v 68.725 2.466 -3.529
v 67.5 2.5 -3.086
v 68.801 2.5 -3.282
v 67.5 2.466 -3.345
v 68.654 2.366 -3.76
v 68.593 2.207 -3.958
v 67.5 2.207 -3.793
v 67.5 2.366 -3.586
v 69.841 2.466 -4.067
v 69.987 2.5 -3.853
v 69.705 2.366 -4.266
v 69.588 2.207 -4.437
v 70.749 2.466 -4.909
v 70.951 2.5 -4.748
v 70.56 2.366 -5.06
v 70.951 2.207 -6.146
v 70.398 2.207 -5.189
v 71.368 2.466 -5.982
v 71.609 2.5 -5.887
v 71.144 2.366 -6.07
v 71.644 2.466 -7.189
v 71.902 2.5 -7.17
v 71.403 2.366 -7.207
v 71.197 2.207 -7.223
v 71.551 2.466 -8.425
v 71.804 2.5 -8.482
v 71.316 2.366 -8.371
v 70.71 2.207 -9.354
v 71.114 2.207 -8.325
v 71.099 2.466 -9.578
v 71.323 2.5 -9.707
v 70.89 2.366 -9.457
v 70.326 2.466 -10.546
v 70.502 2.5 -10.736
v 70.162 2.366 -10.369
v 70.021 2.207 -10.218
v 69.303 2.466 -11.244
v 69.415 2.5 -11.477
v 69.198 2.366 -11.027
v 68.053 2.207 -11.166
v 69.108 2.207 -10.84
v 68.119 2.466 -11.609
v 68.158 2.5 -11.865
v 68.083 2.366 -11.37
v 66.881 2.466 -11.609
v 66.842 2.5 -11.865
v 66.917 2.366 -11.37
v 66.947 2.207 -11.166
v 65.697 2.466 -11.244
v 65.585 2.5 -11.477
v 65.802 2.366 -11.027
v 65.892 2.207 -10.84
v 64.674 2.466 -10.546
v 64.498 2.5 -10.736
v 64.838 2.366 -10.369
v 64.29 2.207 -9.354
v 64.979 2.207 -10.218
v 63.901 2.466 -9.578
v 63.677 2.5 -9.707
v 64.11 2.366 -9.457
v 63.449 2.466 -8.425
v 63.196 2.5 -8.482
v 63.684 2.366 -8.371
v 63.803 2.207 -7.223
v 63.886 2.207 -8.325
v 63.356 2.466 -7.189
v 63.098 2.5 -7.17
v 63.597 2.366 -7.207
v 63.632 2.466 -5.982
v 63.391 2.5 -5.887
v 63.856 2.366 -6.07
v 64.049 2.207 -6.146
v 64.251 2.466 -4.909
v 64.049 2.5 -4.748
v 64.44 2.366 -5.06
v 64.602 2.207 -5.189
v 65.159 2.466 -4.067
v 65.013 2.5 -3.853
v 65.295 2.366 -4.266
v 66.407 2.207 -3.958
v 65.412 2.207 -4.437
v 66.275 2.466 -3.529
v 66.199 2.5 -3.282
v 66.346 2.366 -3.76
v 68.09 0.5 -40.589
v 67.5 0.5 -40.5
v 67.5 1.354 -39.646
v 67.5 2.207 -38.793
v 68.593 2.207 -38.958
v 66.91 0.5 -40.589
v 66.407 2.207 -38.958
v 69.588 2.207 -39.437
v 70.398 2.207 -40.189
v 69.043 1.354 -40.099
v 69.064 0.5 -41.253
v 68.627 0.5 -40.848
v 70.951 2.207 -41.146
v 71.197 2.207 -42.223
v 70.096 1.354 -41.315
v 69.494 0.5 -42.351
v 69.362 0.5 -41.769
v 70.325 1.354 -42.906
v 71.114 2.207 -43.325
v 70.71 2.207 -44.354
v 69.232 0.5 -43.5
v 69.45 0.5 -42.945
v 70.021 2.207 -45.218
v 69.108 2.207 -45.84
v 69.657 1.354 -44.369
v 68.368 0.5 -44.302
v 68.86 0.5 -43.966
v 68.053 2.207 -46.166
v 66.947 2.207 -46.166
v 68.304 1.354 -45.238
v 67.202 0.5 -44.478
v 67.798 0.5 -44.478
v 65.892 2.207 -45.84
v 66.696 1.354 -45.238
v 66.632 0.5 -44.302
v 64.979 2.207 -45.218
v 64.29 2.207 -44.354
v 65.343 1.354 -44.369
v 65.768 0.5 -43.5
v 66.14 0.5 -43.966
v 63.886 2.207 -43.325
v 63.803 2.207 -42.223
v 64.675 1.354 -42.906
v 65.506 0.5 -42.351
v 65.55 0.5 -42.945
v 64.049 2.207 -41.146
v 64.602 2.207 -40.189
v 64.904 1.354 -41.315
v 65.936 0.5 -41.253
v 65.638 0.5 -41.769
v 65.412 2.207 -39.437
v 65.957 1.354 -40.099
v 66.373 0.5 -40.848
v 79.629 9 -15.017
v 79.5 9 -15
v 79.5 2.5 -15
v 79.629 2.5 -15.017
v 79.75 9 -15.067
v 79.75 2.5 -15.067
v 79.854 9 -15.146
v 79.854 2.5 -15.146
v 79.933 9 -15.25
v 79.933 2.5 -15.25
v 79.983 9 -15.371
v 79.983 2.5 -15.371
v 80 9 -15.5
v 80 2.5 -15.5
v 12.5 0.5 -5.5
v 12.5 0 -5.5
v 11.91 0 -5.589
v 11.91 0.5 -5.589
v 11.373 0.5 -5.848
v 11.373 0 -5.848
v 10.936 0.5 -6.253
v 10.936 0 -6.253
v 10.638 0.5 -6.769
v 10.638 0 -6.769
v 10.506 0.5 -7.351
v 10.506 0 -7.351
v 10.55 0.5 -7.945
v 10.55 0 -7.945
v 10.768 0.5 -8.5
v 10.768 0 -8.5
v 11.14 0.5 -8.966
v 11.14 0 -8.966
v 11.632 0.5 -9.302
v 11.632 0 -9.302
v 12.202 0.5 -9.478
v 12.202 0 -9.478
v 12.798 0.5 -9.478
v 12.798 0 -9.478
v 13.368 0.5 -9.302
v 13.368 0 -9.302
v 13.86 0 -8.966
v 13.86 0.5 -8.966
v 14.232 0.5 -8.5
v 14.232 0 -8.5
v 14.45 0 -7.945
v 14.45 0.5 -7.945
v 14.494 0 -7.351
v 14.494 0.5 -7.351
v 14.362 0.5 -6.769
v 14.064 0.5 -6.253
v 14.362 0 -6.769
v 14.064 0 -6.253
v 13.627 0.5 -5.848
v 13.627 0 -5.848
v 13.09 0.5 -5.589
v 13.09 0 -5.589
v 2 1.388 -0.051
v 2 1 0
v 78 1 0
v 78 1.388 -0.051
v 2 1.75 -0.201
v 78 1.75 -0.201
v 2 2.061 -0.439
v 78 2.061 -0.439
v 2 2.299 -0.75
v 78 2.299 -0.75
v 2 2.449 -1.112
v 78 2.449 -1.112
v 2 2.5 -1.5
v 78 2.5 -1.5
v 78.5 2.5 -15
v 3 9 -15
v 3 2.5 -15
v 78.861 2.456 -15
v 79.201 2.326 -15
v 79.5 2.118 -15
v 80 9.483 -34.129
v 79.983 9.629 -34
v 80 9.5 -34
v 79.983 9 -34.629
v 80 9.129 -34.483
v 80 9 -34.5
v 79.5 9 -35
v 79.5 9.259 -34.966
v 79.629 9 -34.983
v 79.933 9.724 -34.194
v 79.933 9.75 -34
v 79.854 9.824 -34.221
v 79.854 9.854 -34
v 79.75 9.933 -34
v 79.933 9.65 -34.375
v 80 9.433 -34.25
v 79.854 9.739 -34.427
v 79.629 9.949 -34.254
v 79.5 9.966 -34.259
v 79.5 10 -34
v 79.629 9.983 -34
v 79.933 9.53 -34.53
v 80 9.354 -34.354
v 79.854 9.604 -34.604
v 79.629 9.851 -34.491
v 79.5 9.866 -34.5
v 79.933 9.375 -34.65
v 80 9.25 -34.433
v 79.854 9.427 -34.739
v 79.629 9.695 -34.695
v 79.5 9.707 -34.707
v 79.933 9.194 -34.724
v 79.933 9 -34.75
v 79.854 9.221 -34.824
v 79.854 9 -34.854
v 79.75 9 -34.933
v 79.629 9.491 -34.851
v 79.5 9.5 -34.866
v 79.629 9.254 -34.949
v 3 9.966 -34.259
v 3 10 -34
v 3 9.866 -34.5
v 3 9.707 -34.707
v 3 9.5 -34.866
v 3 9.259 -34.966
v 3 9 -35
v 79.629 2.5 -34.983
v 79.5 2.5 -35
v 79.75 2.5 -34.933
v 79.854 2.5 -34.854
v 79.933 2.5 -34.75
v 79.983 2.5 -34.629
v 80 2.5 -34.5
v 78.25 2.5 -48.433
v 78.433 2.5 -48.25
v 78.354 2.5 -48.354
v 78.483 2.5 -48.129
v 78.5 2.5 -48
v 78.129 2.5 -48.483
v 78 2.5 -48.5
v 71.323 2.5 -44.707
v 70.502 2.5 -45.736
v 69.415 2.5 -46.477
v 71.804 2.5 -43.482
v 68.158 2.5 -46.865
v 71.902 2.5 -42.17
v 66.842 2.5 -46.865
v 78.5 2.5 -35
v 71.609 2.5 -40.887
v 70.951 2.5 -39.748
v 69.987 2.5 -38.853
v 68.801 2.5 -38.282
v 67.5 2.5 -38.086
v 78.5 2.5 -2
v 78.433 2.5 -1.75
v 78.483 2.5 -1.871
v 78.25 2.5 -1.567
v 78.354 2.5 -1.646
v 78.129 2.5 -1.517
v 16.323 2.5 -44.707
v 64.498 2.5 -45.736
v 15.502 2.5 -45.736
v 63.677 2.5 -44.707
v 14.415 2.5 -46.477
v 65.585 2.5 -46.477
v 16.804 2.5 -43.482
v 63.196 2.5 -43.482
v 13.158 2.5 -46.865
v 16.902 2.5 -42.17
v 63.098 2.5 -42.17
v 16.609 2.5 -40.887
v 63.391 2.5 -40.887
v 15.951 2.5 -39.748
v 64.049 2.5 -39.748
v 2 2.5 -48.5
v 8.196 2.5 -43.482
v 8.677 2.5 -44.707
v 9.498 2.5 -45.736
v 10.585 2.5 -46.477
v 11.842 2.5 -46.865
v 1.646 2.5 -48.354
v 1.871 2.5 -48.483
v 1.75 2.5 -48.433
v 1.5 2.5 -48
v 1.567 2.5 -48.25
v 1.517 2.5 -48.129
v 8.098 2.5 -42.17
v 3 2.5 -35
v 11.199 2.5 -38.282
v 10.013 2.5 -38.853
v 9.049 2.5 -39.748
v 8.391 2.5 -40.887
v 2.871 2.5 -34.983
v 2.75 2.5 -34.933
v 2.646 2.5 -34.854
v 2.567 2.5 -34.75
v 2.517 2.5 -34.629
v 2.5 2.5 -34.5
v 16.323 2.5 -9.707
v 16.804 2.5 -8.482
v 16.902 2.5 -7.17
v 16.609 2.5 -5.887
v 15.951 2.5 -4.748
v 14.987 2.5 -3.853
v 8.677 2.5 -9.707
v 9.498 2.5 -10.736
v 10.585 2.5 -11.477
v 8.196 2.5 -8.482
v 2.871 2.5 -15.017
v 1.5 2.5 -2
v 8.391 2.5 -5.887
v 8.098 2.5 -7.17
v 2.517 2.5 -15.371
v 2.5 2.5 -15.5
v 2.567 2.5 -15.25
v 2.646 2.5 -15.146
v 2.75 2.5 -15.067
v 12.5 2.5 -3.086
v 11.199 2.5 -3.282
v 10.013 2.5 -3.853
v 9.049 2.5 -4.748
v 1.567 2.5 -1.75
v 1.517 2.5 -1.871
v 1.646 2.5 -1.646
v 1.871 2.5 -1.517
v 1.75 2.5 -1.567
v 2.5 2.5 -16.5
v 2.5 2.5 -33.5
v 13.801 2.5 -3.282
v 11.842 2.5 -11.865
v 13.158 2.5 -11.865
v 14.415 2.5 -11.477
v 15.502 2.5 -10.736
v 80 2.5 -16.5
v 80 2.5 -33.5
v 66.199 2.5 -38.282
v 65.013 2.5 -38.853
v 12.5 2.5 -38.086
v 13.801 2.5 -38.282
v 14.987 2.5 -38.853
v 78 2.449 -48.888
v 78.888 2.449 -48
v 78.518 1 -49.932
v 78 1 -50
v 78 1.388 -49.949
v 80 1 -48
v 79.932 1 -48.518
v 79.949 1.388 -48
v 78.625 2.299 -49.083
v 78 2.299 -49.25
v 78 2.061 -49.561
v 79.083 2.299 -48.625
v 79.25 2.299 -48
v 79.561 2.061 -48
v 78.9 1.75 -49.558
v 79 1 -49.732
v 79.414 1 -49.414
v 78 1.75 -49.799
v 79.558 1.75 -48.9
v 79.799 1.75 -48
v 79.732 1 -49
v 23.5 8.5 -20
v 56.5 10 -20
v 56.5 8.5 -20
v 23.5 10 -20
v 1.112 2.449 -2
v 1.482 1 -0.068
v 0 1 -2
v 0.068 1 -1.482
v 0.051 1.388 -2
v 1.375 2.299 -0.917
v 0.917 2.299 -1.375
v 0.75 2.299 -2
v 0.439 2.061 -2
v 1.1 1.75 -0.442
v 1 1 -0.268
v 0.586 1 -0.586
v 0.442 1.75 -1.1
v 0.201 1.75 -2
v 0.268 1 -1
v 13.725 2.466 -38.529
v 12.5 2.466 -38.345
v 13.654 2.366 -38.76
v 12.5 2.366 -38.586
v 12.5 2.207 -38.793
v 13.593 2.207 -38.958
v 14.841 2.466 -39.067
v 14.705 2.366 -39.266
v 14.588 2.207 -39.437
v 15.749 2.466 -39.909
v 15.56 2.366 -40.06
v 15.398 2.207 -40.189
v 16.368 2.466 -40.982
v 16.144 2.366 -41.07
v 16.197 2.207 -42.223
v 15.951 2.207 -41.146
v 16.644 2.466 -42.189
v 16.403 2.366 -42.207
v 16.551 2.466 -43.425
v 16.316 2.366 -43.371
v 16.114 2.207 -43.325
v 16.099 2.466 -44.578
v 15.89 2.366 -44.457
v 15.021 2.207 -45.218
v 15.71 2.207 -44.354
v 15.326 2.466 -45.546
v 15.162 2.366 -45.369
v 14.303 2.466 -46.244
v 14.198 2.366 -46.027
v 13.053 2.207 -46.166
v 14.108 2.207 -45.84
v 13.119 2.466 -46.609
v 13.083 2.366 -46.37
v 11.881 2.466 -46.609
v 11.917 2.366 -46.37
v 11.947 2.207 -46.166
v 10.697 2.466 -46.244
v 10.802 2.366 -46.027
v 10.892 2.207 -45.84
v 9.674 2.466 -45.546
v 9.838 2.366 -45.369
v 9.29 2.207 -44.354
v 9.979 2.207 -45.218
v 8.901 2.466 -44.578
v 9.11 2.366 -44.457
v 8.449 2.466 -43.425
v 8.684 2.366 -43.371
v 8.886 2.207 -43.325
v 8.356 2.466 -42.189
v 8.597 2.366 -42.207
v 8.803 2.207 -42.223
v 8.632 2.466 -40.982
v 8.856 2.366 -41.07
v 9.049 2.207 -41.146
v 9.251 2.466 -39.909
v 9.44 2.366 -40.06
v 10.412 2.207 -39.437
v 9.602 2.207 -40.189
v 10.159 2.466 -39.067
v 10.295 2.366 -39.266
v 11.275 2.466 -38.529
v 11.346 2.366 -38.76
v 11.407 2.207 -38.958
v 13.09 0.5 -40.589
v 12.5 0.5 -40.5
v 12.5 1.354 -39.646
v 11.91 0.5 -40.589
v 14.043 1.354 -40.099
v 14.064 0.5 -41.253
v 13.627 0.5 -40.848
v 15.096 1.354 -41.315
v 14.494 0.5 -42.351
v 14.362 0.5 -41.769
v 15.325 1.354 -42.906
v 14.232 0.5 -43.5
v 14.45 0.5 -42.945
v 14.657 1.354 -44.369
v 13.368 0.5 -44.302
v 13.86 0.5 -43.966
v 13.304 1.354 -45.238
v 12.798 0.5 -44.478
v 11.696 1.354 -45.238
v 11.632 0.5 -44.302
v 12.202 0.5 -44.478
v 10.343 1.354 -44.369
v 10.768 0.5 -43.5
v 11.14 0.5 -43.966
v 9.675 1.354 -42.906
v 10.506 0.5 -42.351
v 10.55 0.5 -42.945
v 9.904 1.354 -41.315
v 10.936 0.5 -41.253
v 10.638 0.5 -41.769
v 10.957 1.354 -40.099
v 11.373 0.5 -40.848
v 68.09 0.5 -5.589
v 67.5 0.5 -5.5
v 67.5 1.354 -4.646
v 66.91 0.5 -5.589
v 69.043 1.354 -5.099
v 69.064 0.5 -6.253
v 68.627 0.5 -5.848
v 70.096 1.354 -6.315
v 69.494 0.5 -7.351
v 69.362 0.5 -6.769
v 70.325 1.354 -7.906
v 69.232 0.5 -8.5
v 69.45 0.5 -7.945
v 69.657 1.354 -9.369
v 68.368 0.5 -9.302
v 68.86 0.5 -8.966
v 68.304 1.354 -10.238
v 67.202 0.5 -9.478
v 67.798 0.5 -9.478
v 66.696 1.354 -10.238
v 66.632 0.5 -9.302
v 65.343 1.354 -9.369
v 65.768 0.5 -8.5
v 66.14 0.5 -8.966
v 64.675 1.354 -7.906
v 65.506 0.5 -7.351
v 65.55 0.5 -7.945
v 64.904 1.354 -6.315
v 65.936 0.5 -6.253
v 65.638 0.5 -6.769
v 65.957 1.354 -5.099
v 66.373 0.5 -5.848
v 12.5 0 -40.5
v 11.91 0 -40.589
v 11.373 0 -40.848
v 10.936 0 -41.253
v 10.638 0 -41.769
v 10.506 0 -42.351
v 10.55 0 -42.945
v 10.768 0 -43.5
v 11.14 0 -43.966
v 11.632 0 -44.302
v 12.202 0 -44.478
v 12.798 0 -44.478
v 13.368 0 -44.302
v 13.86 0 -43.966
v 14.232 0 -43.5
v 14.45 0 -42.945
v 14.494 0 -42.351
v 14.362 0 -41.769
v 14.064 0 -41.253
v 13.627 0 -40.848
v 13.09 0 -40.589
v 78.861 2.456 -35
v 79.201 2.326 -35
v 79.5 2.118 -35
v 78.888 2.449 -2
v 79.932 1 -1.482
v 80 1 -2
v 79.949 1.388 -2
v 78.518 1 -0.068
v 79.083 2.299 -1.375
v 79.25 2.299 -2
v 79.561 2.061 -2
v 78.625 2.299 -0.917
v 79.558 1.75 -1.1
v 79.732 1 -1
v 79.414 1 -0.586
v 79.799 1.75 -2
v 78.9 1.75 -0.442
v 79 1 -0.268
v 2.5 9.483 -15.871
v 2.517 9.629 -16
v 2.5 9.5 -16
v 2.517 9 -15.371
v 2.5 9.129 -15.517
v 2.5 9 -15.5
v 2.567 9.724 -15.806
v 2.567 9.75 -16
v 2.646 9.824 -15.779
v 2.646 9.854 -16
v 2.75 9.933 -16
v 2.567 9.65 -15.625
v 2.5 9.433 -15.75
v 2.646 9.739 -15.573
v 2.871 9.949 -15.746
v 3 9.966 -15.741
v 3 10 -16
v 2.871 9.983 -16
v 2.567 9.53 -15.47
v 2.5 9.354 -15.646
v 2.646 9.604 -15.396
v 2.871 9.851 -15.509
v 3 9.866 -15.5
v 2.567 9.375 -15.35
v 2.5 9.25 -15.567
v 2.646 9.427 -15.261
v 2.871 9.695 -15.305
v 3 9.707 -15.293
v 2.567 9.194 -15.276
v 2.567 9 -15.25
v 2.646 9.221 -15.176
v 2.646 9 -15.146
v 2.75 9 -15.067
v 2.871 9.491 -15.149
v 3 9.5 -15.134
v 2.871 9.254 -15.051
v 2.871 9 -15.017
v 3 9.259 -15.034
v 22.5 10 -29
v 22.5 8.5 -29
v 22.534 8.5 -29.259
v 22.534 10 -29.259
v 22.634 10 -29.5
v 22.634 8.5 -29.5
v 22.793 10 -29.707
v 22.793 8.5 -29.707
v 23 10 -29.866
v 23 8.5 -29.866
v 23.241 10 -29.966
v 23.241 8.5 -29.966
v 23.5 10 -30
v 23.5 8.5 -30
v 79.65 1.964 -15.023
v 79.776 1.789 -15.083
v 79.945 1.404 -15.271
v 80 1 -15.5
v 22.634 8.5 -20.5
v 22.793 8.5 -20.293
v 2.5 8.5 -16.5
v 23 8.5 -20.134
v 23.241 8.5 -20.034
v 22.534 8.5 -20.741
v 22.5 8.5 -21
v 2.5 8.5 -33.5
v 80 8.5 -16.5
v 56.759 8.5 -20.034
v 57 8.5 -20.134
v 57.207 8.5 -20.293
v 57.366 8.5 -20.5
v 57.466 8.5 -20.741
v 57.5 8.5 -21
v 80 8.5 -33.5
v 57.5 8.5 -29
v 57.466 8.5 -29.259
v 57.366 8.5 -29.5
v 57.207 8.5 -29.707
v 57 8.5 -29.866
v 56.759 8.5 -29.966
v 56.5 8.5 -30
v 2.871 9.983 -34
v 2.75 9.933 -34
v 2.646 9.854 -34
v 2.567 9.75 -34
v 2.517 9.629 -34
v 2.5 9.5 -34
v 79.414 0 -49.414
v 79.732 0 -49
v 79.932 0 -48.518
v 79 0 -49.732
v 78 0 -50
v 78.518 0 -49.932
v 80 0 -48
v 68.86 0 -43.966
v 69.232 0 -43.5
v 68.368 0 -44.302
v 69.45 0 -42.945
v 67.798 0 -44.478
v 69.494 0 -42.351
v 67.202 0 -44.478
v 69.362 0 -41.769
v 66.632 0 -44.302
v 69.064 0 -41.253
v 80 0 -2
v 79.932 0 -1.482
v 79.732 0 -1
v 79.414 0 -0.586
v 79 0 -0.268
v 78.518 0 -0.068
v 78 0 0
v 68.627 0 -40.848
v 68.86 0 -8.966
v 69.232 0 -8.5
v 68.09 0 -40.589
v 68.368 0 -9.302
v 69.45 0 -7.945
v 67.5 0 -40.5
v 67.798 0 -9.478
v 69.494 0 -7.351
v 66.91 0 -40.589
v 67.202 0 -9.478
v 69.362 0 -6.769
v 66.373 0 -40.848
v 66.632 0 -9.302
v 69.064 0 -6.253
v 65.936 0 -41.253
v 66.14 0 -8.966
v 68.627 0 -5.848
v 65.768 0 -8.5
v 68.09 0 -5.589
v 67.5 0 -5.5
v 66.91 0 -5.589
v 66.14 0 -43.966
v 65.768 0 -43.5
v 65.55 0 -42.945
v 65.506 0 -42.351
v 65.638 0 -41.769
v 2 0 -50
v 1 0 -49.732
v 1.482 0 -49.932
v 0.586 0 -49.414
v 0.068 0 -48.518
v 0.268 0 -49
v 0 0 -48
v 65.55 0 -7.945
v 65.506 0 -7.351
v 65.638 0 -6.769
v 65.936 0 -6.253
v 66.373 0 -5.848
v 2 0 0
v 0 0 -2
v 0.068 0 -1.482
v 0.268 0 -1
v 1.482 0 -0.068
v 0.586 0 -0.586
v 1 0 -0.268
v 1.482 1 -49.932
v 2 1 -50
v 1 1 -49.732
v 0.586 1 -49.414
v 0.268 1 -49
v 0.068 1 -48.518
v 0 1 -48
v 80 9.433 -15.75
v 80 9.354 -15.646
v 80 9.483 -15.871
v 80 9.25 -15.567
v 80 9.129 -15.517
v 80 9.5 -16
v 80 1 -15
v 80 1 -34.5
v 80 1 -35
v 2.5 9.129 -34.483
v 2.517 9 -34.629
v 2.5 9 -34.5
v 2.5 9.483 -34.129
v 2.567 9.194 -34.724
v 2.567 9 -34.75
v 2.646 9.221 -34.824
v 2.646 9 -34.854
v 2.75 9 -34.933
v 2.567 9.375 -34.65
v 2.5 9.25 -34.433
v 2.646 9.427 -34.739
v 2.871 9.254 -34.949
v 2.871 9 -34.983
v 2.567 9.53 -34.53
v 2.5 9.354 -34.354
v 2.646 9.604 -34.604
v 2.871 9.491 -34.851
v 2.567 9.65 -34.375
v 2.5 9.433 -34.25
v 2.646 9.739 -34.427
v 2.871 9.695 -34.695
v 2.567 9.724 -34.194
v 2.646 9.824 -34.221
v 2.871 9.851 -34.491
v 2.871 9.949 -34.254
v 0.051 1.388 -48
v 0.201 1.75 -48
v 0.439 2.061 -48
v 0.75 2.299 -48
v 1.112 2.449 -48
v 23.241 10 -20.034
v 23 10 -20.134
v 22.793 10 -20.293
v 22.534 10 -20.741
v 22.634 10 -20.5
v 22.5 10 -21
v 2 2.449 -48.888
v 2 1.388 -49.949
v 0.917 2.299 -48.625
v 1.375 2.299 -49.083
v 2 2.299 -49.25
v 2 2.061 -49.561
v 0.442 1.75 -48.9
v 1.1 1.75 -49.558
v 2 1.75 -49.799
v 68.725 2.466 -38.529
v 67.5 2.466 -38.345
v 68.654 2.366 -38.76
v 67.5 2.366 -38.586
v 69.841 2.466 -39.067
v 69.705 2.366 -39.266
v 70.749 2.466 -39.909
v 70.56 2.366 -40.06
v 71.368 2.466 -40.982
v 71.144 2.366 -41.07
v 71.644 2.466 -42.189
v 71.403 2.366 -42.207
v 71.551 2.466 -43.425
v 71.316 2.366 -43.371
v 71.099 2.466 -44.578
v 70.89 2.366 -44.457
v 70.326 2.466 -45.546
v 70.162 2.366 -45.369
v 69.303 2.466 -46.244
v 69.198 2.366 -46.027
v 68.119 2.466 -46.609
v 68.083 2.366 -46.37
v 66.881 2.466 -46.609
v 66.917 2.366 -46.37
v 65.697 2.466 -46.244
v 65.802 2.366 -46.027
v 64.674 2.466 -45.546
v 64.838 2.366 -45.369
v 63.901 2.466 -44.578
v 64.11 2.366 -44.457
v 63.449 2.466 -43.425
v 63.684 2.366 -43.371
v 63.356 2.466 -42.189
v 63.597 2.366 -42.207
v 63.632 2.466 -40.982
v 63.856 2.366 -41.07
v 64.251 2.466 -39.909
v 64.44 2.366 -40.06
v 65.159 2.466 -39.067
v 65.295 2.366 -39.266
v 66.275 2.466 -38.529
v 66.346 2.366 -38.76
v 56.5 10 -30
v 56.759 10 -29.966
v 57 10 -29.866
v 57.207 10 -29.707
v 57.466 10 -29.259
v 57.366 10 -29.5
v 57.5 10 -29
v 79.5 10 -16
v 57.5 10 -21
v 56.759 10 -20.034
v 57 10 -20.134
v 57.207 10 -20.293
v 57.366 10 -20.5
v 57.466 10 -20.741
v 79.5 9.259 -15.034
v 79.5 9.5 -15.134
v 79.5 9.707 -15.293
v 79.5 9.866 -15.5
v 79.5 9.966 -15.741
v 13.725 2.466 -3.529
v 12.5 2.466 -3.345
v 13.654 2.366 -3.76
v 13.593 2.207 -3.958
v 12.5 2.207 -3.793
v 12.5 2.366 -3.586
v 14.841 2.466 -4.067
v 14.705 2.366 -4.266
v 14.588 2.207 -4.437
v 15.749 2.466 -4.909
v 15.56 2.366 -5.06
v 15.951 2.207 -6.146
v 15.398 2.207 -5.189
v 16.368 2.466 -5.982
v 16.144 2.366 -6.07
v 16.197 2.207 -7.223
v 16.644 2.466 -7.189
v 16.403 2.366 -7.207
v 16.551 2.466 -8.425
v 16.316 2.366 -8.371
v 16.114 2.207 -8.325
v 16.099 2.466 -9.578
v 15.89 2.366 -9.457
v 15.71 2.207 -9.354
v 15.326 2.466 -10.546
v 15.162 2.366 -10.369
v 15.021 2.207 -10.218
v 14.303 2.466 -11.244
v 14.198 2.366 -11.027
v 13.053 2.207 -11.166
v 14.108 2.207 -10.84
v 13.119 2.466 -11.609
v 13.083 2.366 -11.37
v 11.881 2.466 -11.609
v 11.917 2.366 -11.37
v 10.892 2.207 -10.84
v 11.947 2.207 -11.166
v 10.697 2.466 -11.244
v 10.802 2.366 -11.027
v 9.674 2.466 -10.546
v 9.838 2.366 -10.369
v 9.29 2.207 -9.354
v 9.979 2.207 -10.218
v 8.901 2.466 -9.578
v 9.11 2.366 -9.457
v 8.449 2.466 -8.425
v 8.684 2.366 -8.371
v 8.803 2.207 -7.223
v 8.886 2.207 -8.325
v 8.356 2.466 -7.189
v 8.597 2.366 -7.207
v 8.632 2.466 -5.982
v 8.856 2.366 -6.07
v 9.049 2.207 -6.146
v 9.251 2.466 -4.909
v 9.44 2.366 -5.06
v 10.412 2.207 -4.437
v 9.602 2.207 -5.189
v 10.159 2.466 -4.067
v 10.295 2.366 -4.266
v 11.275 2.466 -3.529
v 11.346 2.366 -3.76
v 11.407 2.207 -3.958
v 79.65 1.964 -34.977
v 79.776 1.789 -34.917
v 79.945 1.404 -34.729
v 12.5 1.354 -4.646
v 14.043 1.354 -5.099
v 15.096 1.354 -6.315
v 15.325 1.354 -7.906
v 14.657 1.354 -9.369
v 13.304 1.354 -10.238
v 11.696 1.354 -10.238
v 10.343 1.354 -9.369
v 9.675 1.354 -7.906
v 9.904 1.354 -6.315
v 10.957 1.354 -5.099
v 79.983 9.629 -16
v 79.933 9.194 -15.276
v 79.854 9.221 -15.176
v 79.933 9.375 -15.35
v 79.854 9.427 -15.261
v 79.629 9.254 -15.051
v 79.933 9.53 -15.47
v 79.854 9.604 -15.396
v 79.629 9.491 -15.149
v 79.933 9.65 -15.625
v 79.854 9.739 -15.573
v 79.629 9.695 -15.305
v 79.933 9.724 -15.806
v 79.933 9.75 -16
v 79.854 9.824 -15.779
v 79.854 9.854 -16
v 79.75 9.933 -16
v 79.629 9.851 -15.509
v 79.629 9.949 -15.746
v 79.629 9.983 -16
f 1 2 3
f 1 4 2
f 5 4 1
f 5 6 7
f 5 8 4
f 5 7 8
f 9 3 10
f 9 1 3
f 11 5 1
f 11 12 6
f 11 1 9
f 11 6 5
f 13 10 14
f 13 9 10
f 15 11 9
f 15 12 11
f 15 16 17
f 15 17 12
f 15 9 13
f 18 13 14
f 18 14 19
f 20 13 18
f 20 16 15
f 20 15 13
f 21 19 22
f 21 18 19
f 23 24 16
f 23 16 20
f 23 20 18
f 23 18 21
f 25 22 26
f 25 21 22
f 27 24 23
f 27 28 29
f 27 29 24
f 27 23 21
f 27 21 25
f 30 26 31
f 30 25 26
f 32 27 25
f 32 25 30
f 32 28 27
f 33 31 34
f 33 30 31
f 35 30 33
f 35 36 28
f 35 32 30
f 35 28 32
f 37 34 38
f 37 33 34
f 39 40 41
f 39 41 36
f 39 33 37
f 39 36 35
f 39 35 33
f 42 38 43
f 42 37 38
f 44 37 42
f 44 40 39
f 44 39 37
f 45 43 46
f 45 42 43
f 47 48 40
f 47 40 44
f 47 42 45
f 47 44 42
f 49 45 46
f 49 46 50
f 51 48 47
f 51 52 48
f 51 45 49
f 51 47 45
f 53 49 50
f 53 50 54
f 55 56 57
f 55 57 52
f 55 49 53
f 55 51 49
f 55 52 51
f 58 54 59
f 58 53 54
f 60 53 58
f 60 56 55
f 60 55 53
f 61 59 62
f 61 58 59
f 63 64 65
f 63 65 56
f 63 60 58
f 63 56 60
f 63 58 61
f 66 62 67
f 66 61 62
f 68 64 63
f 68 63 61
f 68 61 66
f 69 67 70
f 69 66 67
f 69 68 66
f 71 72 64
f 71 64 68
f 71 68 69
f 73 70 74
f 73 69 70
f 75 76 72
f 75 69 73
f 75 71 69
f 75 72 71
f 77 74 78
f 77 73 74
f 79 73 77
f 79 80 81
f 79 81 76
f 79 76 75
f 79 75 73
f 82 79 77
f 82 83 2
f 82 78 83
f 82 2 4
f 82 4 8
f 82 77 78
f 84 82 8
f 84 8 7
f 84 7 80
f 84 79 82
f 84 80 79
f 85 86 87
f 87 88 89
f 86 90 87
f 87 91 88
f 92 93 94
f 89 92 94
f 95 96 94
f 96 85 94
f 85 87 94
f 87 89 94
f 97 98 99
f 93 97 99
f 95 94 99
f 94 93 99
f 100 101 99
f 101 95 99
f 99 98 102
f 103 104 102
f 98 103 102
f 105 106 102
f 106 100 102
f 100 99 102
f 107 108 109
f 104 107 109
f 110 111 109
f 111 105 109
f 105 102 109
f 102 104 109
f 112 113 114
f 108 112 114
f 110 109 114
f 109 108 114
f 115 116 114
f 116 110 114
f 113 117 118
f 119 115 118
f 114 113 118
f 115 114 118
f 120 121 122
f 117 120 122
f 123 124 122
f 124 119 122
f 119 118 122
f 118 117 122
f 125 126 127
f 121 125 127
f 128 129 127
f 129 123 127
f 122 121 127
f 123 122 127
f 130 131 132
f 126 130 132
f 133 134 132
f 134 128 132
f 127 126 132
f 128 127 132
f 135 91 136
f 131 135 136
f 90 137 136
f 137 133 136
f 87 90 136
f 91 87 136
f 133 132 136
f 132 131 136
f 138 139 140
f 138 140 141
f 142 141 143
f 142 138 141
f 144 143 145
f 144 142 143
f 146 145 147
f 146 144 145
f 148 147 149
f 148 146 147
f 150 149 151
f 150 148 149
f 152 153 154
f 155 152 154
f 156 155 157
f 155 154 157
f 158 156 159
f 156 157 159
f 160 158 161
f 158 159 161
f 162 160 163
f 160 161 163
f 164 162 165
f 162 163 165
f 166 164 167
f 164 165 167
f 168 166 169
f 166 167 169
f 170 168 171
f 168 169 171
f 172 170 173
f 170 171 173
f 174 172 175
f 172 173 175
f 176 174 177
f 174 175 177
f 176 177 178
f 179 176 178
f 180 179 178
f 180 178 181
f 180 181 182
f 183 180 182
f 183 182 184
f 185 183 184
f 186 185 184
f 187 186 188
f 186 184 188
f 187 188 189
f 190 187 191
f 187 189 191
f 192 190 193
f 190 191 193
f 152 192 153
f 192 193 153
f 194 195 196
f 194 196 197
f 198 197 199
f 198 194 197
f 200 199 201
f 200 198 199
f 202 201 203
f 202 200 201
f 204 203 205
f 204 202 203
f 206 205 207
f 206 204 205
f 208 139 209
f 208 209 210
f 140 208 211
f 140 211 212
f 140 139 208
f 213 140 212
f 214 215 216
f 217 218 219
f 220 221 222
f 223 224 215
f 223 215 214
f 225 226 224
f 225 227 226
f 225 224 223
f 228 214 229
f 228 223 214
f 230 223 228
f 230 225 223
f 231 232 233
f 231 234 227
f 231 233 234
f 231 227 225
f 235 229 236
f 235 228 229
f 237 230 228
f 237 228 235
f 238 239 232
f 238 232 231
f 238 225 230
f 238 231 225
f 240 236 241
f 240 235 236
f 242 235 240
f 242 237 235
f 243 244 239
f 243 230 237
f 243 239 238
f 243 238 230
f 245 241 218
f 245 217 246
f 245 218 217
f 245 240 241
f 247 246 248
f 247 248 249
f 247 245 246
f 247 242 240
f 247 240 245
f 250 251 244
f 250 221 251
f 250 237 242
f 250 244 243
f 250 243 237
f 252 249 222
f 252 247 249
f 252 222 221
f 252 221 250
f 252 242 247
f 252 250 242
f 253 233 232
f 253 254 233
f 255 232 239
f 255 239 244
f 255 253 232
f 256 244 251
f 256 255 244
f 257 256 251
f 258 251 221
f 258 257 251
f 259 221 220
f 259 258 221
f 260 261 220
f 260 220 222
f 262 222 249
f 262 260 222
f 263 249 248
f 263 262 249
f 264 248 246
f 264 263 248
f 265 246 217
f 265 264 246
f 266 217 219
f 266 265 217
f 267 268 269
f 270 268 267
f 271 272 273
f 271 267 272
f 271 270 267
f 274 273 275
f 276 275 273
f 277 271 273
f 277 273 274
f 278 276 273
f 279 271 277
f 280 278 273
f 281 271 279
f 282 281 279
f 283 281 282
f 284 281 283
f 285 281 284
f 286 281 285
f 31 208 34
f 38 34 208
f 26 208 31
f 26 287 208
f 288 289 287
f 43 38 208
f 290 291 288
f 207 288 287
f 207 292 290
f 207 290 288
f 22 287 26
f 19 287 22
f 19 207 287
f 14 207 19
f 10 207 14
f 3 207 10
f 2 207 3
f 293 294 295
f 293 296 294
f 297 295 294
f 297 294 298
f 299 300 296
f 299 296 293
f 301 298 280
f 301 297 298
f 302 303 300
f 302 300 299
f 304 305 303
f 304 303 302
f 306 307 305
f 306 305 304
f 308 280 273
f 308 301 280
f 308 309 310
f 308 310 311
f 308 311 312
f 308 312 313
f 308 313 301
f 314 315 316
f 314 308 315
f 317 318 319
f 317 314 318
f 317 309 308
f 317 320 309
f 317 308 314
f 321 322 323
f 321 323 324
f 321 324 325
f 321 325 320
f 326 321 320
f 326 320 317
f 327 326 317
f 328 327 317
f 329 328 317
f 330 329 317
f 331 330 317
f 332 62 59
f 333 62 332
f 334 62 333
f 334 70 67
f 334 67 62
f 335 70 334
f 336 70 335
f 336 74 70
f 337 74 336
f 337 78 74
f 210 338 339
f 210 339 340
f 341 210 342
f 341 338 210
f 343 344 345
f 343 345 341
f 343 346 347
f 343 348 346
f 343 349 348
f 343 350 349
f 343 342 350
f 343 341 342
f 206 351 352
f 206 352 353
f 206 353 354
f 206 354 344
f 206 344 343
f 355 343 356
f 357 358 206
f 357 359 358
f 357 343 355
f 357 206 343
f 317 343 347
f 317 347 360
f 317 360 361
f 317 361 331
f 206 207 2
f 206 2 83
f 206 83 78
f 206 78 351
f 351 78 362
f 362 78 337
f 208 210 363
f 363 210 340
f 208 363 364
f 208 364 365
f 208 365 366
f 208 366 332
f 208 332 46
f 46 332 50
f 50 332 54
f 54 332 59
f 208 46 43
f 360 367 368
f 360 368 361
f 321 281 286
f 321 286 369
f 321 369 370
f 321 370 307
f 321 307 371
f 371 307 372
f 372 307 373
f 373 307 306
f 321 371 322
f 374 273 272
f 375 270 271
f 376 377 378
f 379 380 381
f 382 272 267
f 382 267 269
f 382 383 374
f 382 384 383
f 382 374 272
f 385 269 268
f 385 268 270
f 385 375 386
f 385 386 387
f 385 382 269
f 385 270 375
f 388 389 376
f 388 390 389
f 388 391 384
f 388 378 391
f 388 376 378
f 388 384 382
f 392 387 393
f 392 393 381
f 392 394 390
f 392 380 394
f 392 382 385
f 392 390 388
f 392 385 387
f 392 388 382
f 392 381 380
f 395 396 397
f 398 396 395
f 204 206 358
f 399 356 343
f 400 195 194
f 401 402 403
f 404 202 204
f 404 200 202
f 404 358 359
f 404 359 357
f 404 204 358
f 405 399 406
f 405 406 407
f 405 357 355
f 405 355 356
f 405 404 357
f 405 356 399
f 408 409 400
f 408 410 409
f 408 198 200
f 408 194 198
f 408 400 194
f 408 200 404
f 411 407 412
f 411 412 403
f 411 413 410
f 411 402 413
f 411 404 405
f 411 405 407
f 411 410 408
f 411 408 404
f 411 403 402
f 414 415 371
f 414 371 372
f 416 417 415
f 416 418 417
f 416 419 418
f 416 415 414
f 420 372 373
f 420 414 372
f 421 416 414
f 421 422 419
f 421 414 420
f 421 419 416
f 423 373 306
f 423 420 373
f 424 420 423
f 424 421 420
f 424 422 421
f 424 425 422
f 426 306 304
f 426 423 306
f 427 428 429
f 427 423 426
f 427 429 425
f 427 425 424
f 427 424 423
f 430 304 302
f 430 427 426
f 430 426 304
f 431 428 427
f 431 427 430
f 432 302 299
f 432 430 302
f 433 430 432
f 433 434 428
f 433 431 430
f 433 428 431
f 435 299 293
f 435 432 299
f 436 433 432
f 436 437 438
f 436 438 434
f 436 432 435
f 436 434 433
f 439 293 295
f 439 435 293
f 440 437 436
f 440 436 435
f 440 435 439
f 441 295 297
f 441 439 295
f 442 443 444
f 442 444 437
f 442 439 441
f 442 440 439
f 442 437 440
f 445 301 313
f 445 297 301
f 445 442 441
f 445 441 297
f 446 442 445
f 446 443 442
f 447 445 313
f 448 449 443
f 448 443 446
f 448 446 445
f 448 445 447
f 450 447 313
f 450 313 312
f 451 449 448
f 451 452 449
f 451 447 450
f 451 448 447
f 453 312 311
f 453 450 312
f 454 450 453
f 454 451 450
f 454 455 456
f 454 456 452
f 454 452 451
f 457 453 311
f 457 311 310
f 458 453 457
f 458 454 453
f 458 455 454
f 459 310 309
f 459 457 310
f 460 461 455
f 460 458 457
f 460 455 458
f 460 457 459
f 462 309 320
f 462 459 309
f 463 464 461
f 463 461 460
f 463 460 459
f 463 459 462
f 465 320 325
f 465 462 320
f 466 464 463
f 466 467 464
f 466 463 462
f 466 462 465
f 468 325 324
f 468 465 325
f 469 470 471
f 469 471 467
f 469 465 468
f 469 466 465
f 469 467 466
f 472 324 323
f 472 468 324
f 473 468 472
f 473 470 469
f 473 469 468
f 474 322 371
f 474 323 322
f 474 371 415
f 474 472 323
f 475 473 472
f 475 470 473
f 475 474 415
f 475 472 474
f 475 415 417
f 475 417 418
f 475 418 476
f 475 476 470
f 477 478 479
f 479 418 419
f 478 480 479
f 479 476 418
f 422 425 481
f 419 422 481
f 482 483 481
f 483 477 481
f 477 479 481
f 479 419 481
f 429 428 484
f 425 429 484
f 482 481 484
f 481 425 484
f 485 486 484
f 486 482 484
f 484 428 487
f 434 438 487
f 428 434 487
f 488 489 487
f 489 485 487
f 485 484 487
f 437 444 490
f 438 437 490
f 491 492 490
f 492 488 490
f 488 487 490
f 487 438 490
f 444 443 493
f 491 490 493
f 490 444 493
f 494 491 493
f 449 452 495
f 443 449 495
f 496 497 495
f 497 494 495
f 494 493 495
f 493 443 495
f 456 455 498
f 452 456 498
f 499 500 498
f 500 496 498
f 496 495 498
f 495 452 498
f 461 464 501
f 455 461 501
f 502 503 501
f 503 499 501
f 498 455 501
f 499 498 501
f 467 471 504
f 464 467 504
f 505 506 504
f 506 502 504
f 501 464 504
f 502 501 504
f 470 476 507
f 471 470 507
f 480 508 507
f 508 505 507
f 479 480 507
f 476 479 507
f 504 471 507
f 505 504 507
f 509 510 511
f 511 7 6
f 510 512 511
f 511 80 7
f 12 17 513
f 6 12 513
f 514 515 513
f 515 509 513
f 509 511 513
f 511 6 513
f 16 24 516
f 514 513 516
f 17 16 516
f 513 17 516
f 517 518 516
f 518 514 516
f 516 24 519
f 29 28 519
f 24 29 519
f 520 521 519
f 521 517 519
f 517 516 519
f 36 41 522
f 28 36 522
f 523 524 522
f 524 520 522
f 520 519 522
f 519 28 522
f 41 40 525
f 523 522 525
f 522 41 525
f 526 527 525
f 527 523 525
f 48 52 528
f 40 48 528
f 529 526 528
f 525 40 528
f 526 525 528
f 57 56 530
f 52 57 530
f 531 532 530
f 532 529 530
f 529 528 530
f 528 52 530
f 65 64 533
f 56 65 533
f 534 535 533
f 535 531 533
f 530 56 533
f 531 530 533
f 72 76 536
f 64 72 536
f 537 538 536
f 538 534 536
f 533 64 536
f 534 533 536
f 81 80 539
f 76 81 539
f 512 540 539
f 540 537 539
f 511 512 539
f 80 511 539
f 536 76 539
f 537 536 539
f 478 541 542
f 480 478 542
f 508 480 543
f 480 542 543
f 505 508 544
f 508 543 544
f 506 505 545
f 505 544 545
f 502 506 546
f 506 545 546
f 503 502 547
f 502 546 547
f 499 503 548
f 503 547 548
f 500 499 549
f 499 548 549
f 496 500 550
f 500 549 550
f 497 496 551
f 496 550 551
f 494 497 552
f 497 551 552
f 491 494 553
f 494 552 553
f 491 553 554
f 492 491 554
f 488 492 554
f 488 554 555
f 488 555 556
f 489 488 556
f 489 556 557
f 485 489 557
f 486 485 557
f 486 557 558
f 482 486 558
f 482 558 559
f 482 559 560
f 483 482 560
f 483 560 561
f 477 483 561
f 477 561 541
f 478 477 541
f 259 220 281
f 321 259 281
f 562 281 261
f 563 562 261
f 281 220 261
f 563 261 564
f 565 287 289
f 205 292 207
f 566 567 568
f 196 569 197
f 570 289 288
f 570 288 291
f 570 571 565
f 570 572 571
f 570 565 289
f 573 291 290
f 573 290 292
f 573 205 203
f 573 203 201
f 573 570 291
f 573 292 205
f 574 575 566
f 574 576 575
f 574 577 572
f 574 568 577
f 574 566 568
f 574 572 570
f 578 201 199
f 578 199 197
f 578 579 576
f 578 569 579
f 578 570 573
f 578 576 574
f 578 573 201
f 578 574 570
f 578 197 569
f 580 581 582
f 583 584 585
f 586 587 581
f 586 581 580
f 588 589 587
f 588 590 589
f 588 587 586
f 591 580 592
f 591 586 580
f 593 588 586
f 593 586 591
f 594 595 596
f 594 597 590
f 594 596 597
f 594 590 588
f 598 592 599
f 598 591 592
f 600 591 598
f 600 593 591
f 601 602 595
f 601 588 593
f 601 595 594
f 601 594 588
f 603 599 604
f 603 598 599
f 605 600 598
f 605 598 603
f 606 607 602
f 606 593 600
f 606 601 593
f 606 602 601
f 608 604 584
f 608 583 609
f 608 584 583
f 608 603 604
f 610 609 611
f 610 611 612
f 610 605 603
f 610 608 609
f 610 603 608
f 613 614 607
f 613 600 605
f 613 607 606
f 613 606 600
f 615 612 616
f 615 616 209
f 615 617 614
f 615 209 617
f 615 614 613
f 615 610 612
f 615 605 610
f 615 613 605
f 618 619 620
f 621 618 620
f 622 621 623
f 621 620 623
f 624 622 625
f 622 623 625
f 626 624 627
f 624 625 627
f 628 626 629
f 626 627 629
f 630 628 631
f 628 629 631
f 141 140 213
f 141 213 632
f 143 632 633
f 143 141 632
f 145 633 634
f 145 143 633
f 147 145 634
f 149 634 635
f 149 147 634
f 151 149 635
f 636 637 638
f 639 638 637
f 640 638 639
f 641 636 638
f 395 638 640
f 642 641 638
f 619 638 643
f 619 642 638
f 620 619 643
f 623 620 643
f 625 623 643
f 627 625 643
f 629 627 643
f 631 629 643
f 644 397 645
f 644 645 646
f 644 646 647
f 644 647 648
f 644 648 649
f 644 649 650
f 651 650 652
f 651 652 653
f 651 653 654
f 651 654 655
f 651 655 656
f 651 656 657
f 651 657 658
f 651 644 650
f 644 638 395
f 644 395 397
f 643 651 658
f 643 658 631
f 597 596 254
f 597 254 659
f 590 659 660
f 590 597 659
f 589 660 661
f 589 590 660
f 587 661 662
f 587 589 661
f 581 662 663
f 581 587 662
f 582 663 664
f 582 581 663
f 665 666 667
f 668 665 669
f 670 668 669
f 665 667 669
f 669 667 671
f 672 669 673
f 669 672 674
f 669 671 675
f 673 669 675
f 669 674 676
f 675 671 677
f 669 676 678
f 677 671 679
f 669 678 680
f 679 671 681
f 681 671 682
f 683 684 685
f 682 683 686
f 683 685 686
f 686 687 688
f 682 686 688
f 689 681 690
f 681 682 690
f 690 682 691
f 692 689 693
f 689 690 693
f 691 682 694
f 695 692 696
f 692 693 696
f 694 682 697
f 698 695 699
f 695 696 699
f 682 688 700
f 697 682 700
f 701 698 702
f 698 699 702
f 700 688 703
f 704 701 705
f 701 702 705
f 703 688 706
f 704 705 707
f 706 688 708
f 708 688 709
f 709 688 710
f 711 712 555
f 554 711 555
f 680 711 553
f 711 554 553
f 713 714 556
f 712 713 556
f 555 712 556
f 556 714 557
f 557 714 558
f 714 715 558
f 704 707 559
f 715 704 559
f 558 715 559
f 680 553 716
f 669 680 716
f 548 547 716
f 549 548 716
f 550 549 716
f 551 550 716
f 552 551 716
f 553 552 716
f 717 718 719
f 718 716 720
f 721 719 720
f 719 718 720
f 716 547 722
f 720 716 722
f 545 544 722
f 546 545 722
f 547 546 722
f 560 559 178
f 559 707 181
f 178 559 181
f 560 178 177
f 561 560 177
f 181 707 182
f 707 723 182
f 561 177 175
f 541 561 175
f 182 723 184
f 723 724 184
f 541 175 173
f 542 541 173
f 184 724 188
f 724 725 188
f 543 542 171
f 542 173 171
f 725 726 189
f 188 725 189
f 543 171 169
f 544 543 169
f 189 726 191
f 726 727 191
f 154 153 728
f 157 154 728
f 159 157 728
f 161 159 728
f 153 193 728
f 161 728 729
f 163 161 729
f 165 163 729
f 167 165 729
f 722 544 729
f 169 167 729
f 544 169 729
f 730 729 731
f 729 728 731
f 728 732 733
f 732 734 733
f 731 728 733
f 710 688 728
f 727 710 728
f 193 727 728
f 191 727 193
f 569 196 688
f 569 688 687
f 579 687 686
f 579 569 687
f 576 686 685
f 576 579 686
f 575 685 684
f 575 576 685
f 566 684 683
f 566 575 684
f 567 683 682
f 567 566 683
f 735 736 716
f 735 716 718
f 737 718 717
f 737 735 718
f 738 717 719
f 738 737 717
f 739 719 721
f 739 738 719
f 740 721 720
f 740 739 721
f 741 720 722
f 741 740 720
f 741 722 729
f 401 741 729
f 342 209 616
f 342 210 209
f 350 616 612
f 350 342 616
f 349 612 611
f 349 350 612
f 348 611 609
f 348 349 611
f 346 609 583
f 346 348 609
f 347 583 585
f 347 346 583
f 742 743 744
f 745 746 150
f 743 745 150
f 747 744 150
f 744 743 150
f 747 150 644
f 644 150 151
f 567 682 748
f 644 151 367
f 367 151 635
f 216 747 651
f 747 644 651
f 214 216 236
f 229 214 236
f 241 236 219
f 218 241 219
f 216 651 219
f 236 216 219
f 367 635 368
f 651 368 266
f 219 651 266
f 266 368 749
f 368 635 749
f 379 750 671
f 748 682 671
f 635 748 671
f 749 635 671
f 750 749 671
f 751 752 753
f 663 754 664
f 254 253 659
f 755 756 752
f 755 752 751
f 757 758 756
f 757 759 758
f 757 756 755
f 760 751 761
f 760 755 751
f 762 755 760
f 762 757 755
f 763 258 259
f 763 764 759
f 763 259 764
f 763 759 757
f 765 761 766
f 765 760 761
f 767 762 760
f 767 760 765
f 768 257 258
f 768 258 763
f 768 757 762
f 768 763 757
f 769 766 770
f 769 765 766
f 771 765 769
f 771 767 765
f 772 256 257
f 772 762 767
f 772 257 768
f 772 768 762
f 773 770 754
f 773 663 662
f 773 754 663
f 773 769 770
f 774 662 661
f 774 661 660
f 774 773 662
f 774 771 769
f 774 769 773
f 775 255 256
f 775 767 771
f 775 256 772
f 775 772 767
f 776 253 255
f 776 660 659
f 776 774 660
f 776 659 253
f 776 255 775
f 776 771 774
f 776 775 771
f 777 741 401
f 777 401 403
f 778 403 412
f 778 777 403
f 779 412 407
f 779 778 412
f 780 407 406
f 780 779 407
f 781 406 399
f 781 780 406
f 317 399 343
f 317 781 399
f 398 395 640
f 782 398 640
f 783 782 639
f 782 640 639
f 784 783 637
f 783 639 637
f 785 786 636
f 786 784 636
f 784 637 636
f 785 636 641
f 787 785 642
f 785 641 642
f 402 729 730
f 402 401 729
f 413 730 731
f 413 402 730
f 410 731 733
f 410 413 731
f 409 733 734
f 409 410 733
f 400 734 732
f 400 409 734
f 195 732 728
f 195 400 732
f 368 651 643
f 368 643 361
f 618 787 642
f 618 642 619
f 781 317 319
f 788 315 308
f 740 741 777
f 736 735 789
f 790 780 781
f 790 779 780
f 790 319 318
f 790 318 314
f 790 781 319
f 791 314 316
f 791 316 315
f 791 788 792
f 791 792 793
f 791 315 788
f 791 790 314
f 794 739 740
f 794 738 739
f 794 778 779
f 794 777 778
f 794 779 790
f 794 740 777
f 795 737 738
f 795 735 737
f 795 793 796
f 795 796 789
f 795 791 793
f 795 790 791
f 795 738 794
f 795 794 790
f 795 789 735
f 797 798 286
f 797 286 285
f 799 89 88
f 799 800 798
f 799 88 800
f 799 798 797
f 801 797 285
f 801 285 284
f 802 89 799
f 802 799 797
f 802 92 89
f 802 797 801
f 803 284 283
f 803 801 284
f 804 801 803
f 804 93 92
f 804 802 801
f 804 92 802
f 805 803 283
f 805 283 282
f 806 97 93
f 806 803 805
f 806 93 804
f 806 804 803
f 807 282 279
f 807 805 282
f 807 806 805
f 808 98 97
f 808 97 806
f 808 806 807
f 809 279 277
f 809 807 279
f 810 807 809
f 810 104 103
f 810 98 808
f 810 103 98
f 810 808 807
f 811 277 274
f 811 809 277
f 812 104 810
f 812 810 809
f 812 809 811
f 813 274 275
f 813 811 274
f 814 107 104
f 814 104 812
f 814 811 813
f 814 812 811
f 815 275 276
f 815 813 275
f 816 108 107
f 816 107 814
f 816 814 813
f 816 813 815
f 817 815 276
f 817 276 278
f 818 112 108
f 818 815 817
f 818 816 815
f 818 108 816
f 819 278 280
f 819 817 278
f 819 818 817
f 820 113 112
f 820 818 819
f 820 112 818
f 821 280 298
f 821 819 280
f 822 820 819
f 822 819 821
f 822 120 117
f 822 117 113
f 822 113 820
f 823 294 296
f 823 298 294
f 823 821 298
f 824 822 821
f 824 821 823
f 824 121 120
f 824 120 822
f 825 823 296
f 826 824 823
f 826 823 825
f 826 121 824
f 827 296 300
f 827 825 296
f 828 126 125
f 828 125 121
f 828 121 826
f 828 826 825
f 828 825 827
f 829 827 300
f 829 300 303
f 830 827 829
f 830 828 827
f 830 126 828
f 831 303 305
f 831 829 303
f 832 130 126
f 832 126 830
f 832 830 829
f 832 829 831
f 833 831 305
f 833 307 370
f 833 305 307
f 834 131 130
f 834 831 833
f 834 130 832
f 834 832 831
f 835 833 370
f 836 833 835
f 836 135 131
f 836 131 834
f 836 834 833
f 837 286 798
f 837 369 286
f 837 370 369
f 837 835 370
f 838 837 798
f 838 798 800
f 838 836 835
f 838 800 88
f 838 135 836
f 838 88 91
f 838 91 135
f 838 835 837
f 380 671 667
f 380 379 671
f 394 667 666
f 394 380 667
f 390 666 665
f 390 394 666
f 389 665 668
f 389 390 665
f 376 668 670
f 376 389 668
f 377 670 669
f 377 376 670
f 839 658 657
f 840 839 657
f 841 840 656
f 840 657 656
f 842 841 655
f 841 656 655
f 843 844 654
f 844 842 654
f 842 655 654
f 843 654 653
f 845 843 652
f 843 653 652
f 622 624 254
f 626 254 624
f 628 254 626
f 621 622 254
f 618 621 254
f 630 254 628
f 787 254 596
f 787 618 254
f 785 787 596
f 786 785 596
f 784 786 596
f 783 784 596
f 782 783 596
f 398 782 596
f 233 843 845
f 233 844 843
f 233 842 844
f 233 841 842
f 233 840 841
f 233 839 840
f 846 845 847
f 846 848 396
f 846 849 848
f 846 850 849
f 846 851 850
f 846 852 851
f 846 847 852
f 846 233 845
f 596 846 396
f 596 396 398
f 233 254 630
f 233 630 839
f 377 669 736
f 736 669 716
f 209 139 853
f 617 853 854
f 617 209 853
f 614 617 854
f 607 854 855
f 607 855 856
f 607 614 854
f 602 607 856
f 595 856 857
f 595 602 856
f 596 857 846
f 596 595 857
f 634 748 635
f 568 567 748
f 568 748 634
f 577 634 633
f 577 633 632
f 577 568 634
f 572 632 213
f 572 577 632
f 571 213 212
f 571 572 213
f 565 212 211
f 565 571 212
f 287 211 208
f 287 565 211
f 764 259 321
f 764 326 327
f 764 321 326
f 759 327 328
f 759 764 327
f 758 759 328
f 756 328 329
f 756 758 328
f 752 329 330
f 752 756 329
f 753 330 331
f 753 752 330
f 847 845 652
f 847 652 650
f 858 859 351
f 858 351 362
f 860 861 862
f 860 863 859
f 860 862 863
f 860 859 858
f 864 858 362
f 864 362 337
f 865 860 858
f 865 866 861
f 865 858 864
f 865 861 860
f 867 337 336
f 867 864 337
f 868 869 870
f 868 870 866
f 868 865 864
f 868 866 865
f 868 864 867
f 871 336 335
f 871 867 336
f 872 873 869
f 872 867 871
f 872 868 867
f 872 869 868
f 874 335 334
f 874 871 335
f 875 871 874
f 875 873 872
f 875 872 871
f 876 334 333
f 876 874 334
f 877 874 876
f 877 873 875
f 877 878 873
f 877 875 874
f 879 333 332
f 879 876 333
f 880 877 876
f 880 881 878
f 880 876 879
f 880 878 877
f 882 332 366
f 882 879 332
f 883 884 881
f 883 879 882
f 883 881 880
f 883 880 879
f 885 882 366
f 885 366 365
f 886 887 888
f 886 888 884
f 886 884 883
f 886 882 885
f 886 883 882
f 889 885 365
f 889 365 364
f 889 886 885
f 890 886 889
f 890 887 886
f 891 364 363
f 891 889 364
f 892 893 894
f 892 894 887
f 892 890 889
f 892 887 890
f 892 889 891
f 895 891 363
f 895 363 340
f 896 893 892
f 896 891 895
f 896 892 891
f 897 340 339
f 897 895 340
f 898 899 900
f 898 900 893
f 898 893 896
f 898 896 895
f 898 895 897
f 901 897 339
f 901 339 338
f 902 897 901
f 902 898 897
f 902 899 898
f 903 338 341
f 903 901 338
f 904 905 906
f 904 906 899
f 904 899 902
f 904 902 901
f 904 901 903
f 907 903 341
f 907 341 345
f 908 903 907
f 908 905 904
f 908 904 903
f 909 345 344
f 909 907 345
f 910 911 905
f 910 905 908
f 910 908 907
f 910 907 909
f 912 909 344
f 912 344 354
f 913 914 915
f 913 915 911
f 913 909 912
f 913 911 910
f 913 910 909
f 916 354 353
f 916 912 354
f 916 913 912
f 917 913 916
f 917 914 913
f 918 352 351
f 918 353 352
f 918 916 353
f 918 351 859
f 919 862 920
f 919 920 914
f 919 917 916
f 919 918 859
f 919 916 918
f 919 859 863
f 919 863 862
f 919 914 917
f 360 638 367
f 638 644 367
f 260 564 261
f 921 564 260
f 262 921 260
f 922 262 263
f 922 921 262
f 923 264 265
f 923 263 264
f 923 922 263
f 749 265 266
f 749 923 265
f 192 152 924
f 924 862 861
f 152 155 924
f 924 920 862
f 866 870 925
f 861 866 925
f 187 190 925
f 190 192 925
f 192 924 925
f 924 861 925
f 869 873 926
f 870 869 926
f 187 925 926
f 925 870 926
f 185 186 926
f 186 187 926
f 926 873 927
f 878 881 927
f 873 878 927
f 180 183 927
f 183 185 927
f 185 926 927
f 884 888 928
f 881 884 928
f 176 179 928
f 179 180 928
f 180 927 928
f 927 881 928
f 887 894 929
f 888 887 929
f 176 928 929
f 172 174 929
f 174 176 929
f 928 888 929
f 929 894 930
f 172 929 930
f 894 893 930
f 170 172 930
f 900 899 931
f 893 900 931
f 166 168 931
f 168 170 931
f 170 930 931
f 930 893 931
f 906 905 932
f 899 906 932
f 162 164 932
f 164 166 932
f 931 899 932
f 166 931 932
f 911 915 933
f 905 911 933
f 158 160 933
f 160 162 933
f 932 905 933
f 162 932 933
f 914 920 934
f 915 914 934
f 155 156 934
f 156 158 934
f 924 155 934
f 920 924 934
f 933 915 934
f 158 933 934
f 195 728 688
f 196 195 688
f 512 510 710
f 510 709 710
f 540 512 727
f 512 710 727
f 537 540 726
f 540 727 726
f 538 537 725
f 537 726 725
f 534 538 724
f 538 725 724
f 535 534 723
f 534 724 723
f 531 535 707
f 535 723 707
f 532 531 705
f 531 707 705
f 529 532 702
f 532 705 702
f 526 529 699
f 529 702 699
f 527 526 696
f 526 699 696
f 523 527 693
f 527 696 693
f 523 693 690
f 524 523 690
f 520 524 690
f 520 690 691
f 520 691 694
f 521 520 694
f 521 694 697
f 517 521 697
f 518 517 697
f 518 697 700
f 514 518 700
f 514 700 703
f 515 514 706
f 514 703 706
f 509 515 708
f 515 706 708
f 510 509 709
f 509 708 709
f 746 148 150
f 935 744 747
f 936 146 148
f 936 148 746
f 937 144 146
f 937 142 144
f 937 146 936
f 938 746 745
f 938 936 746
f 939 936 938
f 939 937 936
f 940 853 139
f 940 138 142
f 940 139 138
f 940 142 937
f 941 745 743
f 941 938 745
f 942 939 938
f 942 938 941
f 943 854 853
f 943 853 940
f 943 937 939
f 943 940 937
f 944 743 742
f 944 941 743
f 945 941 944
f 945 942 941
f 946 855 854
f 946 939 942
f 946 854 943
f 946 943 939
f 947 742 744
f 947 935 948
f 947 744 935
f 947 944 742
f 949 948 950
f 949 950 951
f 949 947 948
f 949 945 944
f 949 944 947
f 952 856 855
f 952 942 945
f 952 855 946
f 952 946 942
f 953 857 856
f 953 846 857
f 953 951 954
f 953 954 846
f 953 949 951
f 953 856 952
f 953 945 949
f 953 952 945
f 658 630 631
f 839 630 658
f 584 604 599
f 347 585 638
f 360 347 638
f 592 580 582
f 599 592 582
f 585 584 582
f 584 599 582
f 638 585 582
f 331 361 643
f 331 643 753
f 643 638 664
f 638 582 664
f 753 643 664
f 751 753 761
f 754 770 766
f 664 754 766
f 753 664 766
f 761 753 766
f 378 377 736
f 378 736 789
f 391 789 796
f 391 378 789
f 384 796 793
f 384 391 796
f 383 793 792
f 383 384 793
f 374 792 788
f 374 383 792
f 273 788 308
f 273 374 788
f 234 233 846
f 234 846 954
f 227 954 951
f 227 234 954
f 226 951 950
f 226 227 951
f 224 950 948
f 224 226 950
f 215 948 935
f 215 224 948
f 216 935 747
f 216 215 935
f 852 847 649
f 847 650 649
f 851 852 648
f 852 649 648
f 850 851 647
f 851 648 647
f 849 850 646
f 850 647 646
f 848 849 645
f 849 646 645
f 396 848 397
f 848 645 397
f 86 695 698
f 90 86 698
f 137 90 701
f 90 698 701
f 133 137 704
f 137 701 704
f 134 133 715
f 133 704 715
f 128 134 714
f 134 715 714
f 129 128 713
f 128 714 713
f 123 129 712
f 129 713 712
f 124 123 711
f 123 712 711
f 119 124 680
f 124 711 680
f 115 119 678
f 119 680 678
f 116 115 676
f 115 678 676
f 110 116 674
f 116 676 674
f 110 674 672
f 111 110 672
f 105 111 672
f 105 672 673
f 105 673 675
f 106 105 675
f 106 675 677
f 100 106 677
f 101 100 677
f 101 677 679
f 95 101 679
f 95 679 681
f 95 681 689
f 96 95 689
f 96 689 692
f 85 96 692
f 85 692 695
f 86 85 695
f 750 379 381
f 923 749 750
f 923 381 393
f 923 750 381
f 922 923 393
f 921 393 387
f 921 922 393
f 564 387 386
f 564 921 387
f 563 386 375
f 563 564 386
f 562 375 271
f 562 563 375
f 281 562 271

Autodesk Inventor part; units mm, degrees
ref_plane "YZ Plane" through (0, 0, 0) normal (1, 0, 0) x (0, 1, 0)
ref_plane "XZ Plane" through (0, 0, 0) normal (0, 1, 0) x (-1, 0, 0)
ref_plane "XY Plane" through (0, 0, 0) normal (0, 0, 1) x (1, 0, 0)
sketch "Sketch1" plane through (0, 0, 0) normal (0, 1, 0) x (-1, 0, 0)
  line L0 (0, 0) -> (-80, 0)
  line L1 (-80, 0) -> (-80, -50)
  line L2 (-80, -50) -> (0, -50)
  line L3 (0, -50) -> (0, 0)
  dimension "d0" = 80
  dimension "d1" = 50
extrude "Extrusion1" add sketch "Sketch1" along normal blind 2.5
sketch "Sketch2" plane through (0, 2.5, 0) normal (0, 1, 0) x (1, 0, 0)
  circle A0 centre (12.5, 7.5) radius 2
  circle A1 centre (67.5, 7.5) radius 2
  circle A2 centre (12.5, 42.5) radius 2
  circle A3 centre (67.5, 42.5) radius 2
  line L0 (0, 0) -> (80, 0) projected
  line L1 (0, 50) -> (0, 0) projected
  dimension "d4" = 4
  dimension "d5" = 4
  dimension "d6" = 4
  dimension "d7" = 4
  dimension "d8" = 55
  dimension "d9" = 35
  dimension "d10" = 7.5
  dimension "d11" = 12.5
sketch "Sketch3" plane through (80, 0, 0) normal (1, 0, 0) x (0, 0, -1)
  line L0 (35, 10) -> (15, 10)
  line L1 (35, 10) -> (35, 2.5)
  line L2 (15, 10) -> (15, 2.5)
  line L3 (0, 2.5) -> (50, 2.5) projected
  line L4 (16.5, 8.5) -> (33.5, 8.5)
  line L5 (33.5, 8.5) -> (33.5, 2.5)
  line L6 (16.5, 8.5) -> (16.5, 2.5)
  point P0 (0, 0)
  point P1 (25, 10)
  point P2 (25, 2.5)
  point P3 (25, 8.5)
  dimension "d14" = 20
  dimension "d15" = 7.5
  dimension "d16" = 7.5
  dimension "d17" = 17
  dimension "d18" = 1.5
extrude "Extrusion3" add sketch "Sketch3" against normal blind 77.5 contours L1 L3 L5 L4 L6 L2 L0
sketch "Sketch4" plane through (80, 10, -15) normal (0, 1, 0) x (1, 0, 0)
  line L0 (-57.5, 15) -> (-22.5, 15)
  line L1 (-22.5, 15) -> (-22.5, 5)
  line L2 (-22.5, 5) -> (-57.5, 5)
  line L3 (-57.5, 5) -> (-57.5, 15)
  line L4 (-77.5, 0) -> (-77.5, 20) projected
  point P0 (-80, -15)
  point P1 (-57.5, 10)
  point P2 (-77.5, 10)
  dimension "d21" = 35
  dimension "d22" = 10
  dimension "d23" = 20
extrude "Extrusion4" cut sketch "Sketch4" against normal blind 1.5
fillet "Fillet2" radius 1 6 edges at (41.25, 10, -15) (41.25, 10, -35) (22.5, 9.25, -30) (57.5, 9.25, -30) (57.5, 9.25, -20) (22.5, 9.25, -20)
fillet "Fillet3" radius 2 4 edges at (80, 1.25, 0) (80, 1.25, -50) (0, 1.25, 0) (0, 1.25, -50)
hole "Hole1" at (67.5, 2.5, -42.5) at (67.5, 2.5, -7.5) at (12.5, 2.5, -7.5) at (12.5, 2.5, -42.5) direction (0, -1, 0) diameter 4 end through all countersink diameter 8 countersink angle 90
fillet "Fillet4" radius 1 4 edges at (67.5, 2.5, -46.5) (12.5, 2.5, -46.5) (67.5, 2.5, -11.5) (12.5, 2.5, -11.5)
fillet "Fillet5" radius 1.5 9 edges at (79.4142, 2.5, -0.5858) (80, 2.5, -8.5) (0.5858, 2.5, -0.5858) (0, 2.5, -25) (0.5858, 2.5, -49.4142) (40, 2.5, -50) (79.4142, 2.5, -49.4142) (80, 2.5, -41.5) (40, 2.5, 0)
fillet "Fillet6" radius 0.5 10 edges at (2.5, 9.7071, -34.7071) (2.5, 5.75, -35) (2.5, 9.7071, -15.2929) (2.5, 5.75, -15) (2.5, 10, -25) (80, 9.7071, -15.2929) (80, 5.75, -15) (80, 9.7071, -34.7071) (80, 5.75, -35) (80, 10, -25)
properties part number "Latch Base" material "Steel"
